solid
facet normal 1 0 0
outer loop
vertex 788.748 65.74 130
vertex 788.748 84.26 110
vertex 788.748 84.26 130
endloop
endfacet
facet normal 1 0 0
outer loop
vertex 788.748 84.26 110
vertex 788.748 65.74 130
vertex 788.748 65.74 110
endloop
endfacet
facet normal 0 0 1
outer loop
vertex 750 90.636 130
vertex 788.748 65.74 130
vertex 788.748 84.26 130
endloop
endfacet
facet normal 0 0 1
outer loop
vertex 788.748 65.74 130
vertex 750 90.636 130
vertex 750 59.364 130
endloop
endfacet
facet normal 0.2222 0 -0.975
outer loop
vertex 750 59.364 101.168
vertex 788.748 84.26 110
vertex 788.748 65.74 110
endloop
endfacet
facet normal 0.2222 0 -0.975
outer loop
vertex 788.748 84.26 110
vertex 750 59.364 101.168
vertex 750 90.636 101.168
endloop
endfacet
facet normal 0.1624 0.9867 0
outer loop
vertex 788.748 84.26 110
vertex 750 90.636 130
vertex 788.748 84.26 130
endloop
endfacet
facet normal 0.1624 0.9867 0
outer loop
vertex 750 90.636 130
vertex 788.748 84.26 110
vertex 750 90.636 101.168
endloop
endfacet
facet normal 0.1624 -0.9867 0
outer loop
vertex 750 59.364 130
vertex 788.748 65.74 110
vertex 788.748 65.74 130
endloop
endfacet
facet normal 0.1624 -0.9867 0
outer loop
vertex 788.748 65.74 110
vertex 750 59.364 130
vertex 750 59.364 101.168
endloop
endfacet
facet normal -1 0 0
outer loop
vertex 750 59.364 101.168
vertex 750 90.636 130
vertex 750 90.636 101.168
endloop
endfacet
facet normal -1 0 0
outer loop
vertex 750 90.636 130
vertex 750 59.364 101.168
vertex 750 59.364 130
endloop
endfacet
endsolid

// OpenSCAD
$fn=50;
difference()
{
	difference()
	{
		translate([0,10,10])
		{
			union()
			{
				difference()
				{
					cube([788.74817,130,120]);
					translate([350,0,0])
					{
						rotate(-12.839588,[0,1,0])
						{
							translate([0,0,-120])
							{
								cube([788.74817,130,120]);
							}
						}
					}
					translate([0,65,0])
					{
						translate([450,65,0])
						{
							rotate(-9.34405,[0,0,1])
							{
								cube([788.74817,130,120]);
							}
						}
					}
					translate([0,65,0])
					{
						mirror([0,1,0])
						{
							translate([450,65,0])
							{
								rotate(-9.34405,[0,0,1])
								{
									cube([788.74817,130,120]);
								}
							}
						}
					}
				}
			}
		}
	}
	cube([750,1000,1000]);
}
